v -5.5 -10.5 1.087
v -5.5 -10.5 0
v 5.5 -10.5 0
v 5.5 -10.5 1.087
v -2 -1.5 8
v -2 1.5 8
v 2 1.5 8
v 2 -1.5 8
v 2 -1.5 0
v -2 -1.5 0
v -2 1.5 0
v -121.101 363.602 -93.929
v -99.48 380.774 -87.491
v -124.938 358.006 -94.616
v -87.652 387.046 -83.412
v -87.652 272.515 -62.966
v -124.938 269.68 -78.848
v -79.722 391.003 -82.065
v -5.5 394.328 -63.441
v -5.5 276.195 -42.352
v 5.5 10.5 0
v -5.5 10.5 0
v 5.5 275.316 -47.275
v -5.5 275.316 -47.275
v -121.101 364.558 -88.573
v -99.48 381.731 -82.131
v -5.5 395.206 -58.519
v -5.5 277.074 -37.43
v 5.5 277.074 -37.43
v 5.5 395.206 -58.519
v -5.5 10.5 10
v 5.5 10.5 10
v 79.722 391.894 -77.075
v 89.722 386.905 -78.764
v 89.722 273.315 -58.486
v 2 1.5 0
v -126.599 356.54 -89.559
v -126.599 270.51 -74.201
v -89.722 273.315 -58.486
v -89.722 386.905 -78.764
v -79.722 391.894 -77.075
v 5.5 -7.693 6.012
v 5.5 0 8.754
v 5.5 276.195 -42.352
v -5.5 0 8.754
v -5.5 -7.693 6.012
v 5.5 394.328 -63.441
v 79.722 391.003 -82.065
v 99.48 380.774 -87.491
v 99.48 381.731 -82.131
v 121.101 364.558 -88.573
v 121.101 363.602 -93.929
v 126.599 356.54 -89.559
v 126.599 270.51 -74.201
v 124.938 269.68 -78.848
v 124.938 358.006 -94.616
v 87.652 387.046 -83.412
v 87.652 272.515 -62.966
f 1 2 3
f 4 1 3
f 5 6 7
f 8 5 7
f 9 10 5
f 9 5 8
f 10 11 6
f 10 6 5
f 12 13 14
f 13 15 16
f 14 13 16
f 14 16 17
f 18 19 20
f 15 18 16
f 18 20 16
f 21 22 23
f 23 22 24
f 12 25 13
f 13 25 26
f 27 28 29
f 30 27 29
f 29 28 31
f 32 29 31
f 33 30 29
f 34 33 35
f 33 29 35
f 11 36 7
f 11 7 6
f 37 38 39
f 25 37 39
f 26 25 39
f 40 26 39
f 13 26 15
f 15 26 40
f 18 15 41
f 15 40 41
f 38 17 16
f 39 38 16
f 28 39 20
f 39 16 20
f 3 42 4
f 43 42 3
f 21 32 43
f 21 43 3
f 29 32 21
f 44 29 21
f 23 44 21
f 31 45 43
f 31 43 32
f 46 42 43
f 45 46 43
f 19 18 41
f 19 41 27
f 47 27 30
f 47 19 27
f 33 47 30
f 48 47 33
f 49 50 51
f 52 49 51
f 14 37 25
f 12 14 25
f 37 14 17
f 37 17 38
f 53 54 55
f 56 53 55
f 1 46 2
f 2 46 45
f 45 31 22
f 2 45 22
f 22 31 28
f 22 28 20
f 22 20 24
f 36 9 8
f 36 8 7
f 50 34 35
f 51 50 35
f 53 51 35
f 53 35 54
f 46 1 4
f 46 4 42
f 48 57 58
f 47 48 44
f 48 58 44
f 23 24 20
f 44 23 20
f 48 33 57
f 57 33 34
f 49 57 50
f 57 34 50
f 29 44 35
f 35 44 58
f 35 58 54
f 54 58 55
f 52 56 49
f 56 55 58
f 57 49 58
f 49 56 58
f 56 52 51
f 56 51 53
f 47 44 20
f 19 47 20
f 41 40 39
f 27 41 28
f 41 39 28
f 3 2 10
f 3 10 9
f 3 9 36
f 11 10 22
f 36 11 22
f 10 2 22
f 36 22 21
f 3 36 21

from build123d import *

# Parameters (mm, degrees)
SKETCH3_W                = 11
SKETCH3_H                = 21
BOSS_EXTRUDE1_DEPTH      = 10
CUT_EXTRUDE1_DEPTH       = 8
CUT_EXTRUDE5_DEPTH       = 8
CUT_EXTRUDE5_DEPTH_BACK  = 8
BOSS_EXTRUDE2_DEPTH      = 5.5
BOSS_EXTRUDE2_DEPTH_BACK = 5.5
BOSS_EXTRUDE6_DEPTH      = 120
CUT_EXTRUDE6_DEPTH       = 120


with BuildPart() as part:
    # Sketch3 → Boss-Extrude1 (new body)
    with BuildSketch(Plane.XY):
        Rectangle(SKETCH3_W, SKETCH3_H)
    extrude(amount=BOSS_EXTRUDE1_DEPTH)

    # Sketch5 → Cut-Extrude1 (cut)
    with BuildSketch(Plane.XY):
        Polygon((0, 1.5), (-2, 1.5), (-2, -1.5), (2, -1.5), (2, 1.5), align=None)
    extrude(amount=CUT_EXTRUDE1_DEPTH, mode=Mode.SUBTRACT)

    # Sketch6 → Cut-Extrude5 (cut, two sides: drawn at the far end of the back side and taken through both)
    with BuildSketch(Plane(origin=(0, 0, 0), x_dir=(0, 0, -1), z_dir=(1, 0, 0)).offset(-CUT_EXTRUDE5_DEPTH_BACK)):
        Polygon((-1.0867085, -10.5), (-6.011599163, -7.693477847), (-8.753565317, 0), (-10, 10.5), (-10, -10.5), (-10, -11.324459918), (-1.0867085, -10.760658811), align=None)
    extrude(amount=CUT_EXTRUDE5_DEPTH + CUT_EXTRUDE5_DEPTH_BACK, mode=Mode.SUBTRACT)

    # Sketch18 → Boss-Extrude2 (add, two sides: drawn at the far end of the back side and taken through both)
    with BuildSketch(Plane(origin=(0, 0, 0), x_dir=(0, 0, -1), z_dir=(1, 0, 0)).offset(-BOSS_EXTRUDE2_DEPTH_BACK)):
        Polygon((0, 10.5), (47.274579224, 275.316482995), (37.430212914, 277.073882193), (-10, 10.5), align=None)
    extrude(amount=BOSS_EXTRUDE2_DEPTH + BOSS_EXTRUDE2_DEPTH_BACK)

    # Sketch20 → Boss-Extrude6 (add)
    with BuildSketch(Plane(origin=(0, 274.99219554, -49.091129779), x_dir=(1, 0, 0), z_dir=(0, 0.9844366310526066, -0.17573991988673054))):
        Polygon((5.5, -11.845269159), (89.722424634, 9.543427454), (126.59891896, 25.507030725), (124.938057952, 30.22777974), (87.652020554, 14.094628059), (5.5, -6.845269159), (-5.5, -6.845269159), (-87.652020554, 14.094628059), (-124.938057952, 30.22777974), (-126.59891896, 25.507030725), (-89.722424634, 9.543427454), (-5.5, -11.845269159), align=None)
    extrude(amount=BOSS_EXTRUDE6_DEPTH)

    # Sketch23 → Cut-Extrude6 (cut)
    with BuildSketch(Plane(origin=(0, 3.839085852, 21.505283175), x_dir=(1, 0, 0), z_dir=(0, 0.17573991988673054, 0.9844366310526066))):
        Polygon((-5.5, 419.339661758), (-1.559239103, 421.572876694), (-44.351514871, 435.559129211), (-45.770075722, 435.559129211), (-131.689368664, 409.111534998), (-185.542931008, 339.339661758), (-131.689368664, 359.582766362), (-121.100925347, 374.450322533), (-99.48017922, 390.223948639), (-79.722424634, 399.339661758), align=None)
        Polygon((5.5, 419.339661758), (79.722424634, 399.339661758), (99.48017922, 390.223948639), (121.100925347, 374.450322533), (131.689368664, 359.582766362), (185.542931008, 339.339661758), (131.689368664, 409.111534998), (45.770075722, 435.559129211), (44.351514871, 435.559129211), (1.559239103, 421.572876694), align=None)
    extrude(amount=-CUT_EXTRUDE6_DEPTH, mode=Mode.SUBTRACT)


solid = part.part
